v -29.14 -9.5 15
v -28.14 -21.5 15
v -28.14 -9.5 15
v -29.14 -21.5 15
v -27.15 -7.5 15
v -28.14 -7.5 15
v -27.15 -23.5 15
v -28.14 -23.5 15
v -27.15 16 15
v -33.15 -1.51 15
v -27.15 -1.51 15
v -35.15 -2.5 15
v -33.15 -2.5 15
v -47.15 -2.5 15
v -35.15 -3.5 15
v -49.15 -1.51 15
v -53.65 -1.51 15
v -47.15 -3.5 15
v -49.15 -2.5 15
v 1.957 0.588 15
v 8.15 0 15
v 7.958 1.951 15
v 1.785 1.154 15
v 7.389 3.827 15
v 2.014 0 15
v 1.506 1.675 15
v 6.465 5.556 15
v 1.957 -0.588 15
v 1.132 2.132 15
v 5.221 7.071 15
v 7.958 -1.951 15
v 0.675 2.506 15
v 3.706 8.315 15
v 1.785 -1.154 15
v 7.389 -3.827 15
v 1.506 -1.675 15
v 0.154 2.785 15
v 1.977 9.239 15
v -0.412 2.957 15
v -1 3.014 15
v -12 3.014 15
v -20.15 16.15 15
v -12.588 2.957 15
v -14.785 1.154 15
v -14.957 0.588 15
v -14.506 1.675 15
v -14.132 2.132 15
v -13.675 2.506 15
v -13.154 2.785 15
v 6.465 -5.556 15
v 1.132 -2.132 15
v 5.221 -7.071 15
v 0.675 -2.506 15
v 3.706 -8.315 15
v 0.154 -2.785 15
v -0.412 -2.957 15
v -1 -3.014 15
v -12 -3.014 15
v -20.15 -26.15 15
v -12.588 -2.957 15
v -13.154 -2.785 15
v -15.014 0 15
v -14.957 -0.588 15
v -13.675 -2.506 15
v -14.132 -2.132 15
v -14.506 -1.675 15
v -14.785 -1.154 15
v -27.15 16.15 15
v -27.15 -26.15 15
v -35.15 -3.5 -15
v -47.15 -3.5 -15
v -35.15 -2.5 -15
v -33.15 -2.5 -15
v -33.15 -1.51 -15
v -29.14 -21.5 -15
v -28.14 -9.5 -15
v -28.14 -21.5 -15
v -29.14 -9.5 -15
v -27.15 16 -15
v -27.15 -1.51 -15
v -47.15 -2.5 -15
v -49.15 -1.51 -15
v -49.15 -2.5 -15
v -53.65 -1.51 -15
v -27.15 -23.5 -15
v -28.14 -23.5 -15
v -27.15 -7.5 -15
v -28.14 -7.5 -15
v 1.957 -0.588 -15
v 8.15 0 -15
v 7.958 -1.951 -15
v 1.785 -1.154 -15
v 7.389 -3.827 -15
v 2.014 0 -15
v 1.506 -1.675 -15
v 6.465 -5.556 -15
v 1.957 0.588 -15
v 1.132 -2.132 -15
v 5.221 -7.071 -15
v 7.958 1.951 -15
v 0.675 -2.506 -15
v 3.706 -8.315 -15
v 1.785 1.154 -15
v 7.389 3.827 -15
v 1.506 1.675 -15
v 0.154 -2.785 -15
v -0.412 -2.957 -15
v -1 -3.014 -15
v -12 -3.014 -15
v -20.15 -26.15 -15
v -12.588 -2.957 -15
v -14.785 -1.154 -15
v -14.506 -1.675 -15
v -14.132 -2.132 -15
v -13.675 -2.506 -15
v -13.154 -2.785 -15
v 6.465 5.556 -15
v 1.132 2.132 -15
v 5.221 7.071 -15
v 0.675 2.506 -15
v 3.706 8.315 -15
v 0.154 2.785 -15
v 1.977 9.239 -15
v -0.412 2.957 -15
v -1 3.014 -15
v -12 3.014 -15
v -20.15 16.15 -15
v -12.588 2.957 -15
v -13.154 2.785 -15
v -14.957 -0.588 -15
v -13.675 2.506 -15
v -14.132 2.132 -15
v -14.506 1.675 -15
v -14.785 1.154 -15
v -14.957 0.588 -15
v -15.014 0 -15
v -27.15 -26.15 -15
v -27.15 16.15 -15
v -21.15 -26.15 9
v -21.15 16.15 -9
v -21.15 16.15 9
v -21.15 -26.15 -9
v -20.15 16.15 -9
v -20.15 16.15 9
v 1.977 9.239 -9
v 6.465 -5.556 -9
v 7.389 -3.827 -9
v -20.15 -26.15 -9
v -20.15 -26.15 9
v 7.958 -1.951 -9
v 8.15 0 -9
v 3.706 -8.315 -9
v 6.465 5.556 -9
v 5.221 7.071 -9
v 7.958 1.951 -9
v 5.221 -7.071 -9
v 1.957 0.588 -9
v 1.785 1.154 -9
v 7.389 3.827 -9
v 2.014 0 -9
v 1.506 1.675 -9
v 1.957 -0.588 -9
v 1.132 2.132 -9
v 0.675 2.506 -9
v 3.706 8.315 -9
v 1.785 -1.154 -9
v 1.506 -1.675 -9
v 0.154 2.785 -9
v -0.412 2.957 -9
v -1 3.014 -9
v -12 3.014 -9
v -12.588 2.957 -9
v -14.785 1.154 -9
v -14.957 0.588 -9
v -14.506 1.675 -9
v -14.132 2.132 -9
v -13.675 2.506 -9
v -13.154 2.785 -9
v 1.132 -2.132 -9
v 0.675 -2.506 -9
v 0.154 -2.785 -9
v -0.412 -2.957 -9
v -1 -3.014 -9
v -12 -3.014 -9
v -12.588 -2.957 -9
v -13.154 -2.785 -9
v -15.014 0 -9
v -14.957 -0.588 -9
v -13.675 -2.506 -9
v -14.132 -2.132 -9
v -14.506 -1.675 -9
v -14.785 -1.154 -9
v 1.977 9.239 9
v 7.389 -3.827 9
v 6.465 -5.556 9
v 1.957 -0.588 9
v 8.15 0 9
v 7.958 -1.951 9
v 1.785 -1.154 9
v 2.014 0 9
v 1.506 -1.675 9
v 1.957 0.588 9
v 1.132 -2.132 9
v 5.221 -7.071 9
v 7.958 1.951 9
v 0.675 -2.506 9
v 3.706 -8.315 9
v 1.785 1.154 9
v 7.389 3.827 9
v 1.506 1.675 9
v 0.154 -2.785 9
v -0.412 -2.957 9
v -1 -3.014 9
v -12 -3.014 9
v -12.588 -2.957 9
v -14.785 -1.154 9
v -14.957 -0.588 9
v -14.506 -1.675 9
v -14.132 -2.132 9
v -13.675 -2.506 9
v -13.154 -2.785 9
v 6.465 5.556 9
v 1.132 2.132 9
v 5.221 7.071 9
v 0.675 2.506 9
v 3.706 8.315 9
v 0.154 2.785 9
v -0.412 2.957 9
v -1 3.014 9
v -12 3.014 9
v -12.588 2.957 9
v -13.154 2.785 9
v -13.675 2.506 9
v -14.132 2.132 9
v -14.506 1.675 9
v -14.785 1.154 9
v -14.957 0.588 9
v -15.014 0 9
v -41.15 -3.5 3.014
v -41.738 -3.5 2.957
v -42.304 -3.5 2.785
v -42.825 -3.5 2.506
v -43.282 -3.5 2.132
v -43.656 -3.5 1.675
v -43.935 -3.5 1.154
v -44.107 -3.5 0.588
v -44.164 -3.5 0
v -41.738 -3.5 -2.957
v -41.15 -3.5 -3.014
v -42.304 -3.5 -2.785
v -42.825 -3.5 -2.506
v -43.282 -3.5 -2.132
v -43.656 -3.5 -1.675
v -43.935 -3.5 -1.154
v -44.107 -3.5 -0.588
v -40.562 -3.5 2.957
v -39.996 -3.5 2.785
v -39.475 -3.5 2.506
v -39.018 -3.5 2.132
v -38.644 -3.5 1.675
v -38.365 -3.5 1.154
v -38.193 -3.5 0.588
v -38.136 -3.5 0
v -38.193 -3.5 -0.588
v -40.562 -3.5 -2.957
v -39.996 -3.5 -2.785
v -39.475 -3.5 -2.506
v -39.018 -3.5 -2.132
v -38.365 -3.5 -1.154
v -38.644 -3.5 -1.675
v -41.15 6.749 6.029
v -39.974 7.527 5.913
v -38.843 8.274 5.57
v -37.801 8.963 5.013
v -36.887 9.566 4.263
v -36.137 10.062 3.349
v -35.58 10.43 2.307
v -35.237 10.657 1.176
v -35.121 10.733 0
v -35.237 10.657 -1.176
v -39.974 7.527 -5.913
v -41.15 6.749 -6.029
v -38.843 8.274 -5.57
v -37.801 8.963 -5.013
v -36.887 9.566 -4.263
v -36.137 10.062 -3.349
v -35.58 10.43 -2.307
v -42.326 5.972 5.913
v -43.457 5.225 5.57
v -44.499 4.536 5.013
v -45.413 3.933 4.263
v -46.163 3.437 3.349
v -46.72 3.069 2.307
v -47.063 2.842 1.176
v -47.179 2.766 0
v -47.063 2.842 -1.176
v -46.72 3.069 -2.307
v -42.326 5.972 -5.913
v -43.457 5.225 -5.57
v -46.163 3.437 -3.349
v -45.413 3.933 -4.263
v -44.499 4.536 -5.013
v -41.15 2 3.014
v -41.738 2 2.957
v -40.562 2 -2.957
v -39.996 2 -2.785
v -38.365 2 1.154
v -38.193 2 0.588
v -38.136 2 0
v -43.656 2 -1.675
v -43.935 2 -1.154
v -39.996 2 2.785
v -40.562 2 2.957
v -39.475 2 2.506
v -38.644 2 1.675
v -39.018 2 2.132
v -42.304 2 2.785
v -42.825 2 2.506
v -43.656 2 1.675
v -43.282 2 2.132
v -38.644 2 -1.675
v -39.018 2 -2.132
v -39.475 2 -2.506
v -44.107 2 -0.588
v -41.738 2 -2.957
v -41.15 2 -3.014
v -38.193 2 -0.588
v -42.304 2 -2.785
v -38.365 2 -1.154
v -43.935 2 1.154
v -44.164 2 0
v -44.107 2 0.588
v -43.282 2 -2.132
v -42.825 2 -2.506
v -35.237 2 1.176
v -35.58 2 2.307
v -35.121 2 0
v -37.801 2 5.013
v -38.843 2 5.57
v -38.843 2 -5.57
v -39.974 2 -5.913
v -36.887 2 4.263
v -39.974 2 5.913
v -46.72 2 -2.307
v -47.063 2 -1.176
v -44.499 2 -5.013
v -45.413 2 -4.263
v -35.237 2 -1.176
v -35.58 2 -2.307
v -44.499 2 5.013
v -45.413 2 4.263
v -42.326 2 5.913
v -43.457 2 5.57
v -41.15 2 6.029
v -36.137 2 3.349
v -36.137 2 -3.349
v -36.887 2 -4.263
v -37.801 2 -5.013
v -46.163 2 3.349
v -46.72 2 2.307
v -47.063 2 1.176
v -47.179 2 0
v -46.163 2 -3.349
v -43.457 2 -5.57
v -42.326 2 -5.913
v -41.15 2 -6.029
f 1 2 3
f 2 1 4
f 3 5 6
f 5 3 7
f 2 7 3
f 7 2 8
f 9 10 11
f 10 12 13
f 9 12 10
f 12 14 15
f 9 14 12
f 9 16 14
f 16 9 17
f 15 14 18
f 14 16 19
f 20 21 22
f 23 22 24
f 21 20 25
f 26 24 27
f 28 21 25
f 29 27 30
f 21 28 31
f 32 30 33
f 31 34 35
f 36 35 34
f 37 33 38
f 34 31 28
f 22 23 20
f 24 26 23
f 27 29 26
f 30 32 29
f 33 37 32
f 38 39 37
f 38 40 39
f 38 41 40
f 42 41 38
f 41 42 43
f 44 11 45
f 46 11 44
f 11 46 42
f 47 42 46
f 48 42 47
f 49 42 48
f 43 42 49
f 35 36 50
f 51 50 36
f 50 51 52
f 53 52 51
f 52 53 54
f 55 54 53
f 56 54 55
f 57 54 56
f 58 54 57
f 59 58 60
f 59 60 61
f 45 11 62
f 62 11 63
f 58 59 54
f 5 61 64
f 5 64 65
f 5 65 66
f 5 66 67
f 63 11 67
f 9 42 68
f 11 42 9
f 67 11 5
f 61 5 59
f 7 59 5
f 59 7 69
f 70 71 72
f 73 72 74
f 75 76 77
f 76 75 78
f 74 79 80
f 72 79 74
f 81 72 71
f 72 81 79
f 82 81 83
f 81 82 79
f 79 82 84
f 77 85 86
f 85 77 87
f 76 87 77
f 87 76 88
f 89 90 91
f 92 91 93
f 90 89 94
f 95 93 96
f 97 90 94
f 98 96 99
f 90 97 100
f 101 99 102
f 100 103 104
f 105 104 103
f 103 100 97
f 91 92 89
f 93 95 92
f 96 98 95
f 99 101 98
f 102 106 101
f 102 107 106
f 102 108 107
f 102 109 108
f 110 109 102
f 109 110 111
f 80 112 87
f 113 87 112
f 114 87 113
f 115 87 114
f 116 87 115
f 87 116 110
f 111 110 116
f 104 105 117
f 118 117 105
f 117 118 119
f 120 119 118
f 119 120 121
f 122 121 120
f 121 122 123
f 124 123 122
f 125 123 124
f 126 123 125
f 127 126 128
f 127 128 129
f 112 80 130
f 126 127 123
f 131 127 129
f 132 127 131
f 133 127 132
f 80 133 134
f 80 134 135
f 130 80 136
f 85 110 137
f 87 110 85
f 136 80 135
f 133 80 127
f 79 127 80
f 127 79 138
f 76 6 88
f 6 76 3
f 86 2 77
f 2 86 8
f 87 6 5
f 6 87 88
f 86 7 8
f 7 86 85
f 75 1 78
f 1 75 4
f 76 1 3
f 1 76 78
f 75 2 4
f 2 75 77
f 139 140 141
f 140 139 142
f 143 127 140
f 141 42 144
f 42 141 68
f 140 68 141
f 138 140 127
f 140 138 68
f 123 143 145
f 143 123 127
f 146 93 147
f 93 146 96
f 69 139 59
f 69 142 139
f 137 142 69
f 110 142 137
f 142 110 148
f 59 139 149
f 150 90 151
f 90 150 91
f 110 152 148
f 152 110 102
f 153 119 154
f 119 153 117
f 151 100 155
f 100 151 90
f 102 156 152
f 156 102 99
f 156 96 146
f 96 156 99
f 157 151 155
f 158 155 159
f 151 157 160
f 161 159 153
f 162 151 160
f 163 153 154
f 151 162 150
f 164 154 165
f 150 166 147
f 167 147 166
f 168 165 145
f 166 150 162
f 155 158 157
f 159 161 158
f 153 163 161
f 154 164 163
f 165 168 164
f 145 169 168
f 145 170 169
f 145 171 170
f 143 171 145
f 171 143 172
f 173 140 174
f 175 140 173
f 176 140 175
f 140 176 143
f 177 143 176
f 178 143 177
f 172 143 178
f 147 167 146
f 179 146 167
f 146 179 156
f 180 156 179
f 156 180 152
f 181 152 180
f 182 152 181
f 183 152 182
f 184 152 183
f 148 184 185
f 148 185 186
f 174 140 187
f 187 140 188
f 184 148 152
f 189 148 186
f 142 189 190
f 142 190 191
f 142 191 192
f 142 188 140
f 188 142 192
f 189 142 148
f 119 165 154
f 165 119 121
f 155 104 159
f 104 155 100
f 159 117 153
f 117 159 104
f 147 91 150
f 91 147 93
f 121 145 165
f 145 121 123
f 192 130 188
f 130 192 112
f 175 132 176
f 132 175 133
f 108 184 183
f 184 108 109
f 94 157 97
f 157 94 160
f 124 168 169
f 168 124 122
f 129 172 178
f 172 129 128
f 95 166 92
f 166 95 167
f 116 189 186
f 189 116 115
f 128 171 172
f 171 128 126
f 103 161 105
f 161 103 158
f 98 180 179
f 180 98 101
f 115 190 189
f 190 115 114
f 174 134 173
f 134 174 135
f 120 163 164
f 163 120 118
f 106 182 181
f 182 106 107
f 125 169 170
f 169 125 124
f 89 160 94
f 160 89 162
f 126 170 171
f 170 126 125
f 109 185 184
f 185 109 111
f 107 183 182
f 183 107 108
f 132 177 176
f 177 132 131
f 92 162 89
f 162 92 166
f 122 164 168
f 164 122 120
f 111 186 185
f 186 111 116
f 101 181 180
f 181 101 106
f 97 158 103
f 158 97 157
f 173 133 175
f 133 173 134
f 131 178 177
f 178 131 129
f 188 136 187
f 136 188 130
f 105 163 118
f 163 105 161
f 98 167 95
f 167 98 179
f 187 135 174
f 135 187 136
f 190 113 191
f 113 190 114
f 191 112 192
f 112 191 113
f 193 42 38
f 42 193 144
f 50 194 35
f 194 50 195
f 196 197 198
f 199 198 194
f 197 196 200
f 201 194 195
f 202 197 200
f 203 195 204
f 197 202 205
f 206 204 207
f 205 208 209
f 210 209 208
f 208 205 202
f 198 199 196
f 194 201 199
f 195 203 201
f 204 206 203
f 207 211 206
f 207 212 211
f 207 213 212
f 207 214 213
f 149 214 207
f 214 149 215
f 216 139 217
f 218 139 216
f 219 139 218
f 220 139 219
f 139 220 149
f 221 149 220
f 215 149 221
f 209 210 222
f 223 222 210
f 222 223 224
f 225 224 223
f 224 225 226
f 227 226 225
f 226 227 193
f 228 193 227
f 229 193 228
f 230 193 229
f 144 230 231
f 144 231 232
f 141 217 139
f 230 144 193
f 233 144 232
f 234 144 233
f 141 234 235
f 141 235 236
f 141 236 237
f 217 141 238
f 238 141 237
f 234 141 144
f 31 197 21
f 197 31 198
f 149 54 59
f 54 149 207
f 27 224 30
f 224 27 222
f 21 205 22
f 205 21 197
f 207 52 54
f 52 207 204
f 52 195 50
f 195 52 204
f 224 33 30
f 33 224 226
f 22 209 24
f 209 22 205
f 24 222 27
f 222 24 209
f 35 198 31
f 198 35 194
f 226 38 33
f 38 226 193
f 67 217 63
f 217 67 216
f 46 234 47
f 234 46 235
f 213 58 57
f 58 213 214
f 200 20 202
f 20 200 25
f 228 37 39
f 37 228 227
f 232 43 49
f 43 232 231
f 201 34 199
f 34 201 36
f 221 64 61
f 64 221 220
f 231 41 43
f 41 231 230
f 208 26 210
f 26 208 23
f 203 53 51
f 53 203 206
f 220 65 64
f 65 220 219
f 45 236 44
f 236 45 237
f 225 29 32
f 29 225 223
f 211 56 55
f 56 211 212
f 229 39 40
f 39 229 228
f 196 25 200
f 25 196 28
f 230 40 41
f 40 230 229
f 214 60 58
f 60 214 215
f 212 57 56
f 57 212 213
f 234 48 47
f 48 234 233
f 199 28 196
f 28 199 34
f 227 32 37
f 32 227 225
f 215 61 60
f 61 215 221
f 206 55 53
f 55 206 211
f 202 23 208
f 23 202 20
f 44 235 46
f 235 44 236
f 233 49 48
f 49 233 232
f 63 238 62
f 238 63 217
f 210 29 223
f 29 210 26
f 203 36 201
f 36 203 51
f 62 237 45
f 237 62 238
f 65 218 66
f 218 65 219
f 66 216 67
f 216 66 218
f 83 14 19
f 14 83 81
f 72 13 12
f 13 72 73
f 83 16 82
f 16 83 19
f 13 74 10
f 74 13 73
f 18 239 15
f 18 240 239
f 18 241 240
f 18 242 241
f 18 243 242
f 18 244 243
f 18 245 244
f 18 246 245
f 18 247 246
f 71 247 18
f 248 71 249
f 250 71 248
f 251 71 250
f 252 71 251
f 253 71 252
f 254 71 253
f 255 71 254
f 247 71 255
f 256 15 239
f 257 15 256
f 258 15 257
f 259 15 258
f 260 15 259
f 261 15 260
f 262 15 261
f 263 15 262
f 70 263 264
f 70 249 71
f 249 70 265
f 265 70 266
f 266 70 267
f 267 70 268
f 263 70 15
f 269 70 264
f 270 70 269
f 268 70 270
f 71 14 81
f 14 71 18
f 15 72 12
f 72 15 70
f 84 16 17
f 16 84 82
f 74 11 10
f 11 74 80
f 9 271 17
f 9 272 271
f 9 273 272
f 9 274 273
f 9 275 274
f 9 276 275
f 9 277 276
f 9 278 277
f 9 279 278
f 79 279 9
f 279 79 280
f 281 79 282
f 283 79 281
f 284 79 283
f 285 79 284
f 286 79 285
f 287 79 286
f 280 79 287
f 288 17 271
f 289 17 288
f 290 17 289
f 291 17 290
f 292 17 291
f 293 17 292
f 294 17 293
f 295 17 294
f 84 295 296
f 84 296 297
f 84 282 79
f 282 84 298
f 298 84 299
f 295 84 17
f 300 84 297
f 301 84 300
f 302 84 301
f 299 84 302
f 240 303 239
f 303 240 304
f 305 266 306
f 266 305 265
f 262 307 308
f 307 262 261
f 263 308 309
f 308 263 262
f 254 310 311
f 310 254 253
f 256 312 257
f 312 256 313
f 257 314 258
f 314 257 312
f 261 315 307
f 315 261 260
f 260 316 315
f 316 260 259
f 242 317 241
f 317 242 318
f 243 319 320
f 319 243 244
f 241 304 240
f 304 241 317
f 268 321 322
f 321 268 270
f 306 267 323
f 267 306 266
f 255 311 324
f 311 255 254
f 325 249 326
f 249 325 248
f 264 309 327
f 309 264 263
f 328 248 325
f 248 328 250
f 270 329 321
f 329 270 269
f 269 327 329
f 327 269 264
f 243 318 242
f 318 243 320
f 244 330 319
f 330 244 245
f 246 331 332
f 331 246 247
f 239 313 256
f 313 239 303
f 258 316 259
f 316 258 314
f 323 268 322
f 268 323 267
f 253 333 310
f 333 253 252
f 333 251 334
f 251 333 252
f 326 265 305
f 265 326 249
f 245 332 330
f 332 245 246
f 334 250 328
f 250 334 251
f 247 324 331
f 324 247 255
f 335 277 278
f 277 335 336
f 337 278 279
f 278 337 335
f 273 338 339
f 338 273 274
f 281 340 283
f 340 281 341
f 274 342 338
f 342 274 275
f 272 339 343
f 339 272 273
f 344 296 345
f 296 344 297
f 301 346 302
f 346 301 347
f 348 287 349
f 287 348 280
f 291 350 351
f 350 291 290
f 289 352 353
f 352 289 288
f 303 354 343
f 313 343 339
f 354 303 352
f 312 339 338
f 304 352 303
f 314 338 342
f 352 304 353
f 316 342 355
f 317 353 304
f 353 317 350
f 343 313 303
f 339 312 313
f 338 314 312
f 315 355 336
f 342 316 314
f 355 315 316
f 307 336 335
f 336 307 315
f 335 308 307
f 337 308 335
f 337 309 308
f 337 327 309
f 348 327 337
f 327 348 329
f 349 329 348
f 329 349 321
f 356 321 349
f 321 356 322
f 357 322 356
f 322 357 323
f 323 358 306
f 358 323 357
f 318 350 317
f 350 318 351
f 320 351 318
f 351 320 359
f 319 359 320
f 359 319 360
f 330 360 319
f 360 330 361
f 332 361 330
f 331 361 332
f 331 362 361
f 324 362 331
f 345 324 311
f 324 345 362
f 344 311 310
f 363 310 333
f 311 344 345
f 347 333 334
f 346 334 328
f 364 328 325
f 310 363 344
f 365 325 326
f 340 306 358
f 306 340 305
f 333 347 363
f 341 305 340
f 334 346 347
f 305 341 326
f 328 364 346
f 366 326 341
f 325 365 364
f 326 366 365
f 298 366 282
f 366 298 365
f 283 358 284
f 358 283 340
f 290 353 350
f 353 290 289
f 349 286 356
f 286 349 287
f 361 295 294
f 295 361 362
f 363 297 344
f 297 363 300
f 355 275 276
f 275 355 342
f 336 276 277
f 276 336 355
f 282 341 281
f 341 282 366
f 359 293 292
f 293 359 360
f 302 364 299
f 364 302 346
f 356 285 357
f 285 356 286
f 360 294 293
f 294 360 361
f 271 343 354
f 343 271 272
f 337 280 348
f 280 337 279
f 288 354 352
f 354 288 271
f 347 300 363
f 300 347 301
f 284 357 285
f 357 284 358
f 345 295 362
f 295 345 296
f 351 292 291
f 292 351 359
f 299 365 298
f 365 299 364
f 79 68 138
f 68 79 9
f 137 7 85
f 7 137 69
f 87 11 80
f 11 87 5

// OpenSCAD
// file: includes/config.scad
$fn=32;

nema_size_x = 42.3;
nema_size_y = 42.3;
nema_screw = 4;
nema_screw_cap = 8;
nema_hole_spacing = 31;
nema_center_hole = 22;

x = 27.35; //bolt hole spacing
y = 45;

X_rod_diameter = 10;
Y_rod_diameter = 8;
Z_rod_diameter = 10; //smooth rod

Z_bearing_dia = 15;
Z_bearing_h = 25;

block_bolt_size = 4;
block_bolt_head = 9;
z_nut = 13;
z_rod = 8; //threaded rod
z_motor_bolt = 5.5;
d_spacer=12;
d_bolt=5;
clearance = 0.25;
// file: includes/adjustments.scad
//these two are needed otherwise you need to put them in
//if you forget it'll complain about unknown variables.
$fn=32;
center=false;

module nut()
{
cylinder(d=(2*(tan(30)*nut_size)),h=nut_h, center=center, $fn=6); // don't do anything here
    //echo ("point to point:"); // this just echoes
    //echo ((tan(30)*nut_size)*2); //the diameter of a circle that will encompass the exterior of the hexagonal shape.
}

module hole()
{ 

    //hole = size of the hole
    //h = height
    cylinder(d=(hole_dia+(hole_dia-(cos(360 / (2*$fn)) * hole_dia) )),h=h,center=center,$fn=$fn); 
    //echo ("real hole diameter");
    //echo ((hole_dia+(hole_dia-(cos(360 / (2*$fn)) * hole_dia) )));
}
// main file
/*note: includes a bolt to secure it but doesn't seem to need it, is tight enough to stay there while loose enough
to slide around, possibly self centering? eh, dunno.

Print as is with supports. I couldn't think of a better orientation that kept the rail insert things
perfect. They need to be rather accurate otherwise it might not fit, or might just fall off.
*/

$fn=32;
include <includes/adjustments.scad>
include <includes/config.scad>
bearing_bolt = 6;
bearing_bolt_cap = 12;
thickness = 6;
screw_meat=3.5;
bearing_width =18;

module rail_steady(){
    translate([0,0,0])cube([1,16,bearing_width+(thickness*2)],center=true);
    translate([-1,0,0])cube([1,12,bearing_width+(thickness*2)],center=true); 
    
}

module bearing_plate(){
    difference(){
        hull(){
            translate([-nema_size_x/2+0.5,nema_size_y/2-0.5-5])cube([1,1,thickness],center=true);
            translate([-nema_size_x/2+0.5,-nema_size_y/2+0.5-5])cube([1,1,thickness],center=true);
            translate([nema_size_x/2-23,0])cylinder(d=20,h=thickness,center=true);
            //translate([nema_size_x/2-23,-nema_size_y/2+15])cylinder(d=20,h=thickness,center=true);
            //translate([nema_size_x/2-23,nema_size_y/2-15])cylinder(d=20,h=thickness,center=true);
        }
        hull(){
            translate([-12,0])hole(hole_dia=bearing_bolt,h=thickness+1,center=true);
            translate([-1,0])hole(hole_dia=bearing_bolt,h=thickness+1,center=true);
        }
    }
}

union(){
    color("blue")translate([-(nema_size_x/2)-(thickness+0.49),-(nema_hole_spacing/2),0])rail_steady();
    color("black")translate([-(nema_size_x/2)-(thickness/2),-5,0])cube([thickness,nema_size_y,bearing_width+(thickness*2)],center=true);
    color("green")translate([0,0,-(bearing_width+thickness)/2])bearing_plate();
    color("green")translate([0,0,(bearing_width+thickness)/2])bearing_plate();
    difference(){   
        union(){
            color("red")translate([-(nema_size_x/2)-(thickness+0.5)-(27/2),-(nema_hole_spacing/2)+(27/2),0])rotate([0,0,90])rail_steady(); 
            translate([0,0,-(bearing_width+(thickness*2))/2])linear_extrude(bearing_width+(thickness*2))polygon(points=[[-(nema_size_x/2)-(thickness-0.5)-27,-(nema_hole_spacing/2)+(27/2)+0.49],[-(nema_size_x/2)-(thickness),16],[-(nema_size_x/2)-(thickness),-(nema_hole_spacing/2)+(27/2)+0.49]]);
        }
            union(){
                translate([-(nema_size_x/2)-(thickness+0.5)-(27/2),0])rotate([90,0])hole(hole_dia=bearing_bolt,h=30,center=true);
                translate([-(nema_size_x/2)-(thickness+0.5)-(27/2),7.5-1.5+screw_meat])rotate([90,0])hole(hole_dia=bearing_bolt_cap,h=15,center=true);
            }
    }
}
